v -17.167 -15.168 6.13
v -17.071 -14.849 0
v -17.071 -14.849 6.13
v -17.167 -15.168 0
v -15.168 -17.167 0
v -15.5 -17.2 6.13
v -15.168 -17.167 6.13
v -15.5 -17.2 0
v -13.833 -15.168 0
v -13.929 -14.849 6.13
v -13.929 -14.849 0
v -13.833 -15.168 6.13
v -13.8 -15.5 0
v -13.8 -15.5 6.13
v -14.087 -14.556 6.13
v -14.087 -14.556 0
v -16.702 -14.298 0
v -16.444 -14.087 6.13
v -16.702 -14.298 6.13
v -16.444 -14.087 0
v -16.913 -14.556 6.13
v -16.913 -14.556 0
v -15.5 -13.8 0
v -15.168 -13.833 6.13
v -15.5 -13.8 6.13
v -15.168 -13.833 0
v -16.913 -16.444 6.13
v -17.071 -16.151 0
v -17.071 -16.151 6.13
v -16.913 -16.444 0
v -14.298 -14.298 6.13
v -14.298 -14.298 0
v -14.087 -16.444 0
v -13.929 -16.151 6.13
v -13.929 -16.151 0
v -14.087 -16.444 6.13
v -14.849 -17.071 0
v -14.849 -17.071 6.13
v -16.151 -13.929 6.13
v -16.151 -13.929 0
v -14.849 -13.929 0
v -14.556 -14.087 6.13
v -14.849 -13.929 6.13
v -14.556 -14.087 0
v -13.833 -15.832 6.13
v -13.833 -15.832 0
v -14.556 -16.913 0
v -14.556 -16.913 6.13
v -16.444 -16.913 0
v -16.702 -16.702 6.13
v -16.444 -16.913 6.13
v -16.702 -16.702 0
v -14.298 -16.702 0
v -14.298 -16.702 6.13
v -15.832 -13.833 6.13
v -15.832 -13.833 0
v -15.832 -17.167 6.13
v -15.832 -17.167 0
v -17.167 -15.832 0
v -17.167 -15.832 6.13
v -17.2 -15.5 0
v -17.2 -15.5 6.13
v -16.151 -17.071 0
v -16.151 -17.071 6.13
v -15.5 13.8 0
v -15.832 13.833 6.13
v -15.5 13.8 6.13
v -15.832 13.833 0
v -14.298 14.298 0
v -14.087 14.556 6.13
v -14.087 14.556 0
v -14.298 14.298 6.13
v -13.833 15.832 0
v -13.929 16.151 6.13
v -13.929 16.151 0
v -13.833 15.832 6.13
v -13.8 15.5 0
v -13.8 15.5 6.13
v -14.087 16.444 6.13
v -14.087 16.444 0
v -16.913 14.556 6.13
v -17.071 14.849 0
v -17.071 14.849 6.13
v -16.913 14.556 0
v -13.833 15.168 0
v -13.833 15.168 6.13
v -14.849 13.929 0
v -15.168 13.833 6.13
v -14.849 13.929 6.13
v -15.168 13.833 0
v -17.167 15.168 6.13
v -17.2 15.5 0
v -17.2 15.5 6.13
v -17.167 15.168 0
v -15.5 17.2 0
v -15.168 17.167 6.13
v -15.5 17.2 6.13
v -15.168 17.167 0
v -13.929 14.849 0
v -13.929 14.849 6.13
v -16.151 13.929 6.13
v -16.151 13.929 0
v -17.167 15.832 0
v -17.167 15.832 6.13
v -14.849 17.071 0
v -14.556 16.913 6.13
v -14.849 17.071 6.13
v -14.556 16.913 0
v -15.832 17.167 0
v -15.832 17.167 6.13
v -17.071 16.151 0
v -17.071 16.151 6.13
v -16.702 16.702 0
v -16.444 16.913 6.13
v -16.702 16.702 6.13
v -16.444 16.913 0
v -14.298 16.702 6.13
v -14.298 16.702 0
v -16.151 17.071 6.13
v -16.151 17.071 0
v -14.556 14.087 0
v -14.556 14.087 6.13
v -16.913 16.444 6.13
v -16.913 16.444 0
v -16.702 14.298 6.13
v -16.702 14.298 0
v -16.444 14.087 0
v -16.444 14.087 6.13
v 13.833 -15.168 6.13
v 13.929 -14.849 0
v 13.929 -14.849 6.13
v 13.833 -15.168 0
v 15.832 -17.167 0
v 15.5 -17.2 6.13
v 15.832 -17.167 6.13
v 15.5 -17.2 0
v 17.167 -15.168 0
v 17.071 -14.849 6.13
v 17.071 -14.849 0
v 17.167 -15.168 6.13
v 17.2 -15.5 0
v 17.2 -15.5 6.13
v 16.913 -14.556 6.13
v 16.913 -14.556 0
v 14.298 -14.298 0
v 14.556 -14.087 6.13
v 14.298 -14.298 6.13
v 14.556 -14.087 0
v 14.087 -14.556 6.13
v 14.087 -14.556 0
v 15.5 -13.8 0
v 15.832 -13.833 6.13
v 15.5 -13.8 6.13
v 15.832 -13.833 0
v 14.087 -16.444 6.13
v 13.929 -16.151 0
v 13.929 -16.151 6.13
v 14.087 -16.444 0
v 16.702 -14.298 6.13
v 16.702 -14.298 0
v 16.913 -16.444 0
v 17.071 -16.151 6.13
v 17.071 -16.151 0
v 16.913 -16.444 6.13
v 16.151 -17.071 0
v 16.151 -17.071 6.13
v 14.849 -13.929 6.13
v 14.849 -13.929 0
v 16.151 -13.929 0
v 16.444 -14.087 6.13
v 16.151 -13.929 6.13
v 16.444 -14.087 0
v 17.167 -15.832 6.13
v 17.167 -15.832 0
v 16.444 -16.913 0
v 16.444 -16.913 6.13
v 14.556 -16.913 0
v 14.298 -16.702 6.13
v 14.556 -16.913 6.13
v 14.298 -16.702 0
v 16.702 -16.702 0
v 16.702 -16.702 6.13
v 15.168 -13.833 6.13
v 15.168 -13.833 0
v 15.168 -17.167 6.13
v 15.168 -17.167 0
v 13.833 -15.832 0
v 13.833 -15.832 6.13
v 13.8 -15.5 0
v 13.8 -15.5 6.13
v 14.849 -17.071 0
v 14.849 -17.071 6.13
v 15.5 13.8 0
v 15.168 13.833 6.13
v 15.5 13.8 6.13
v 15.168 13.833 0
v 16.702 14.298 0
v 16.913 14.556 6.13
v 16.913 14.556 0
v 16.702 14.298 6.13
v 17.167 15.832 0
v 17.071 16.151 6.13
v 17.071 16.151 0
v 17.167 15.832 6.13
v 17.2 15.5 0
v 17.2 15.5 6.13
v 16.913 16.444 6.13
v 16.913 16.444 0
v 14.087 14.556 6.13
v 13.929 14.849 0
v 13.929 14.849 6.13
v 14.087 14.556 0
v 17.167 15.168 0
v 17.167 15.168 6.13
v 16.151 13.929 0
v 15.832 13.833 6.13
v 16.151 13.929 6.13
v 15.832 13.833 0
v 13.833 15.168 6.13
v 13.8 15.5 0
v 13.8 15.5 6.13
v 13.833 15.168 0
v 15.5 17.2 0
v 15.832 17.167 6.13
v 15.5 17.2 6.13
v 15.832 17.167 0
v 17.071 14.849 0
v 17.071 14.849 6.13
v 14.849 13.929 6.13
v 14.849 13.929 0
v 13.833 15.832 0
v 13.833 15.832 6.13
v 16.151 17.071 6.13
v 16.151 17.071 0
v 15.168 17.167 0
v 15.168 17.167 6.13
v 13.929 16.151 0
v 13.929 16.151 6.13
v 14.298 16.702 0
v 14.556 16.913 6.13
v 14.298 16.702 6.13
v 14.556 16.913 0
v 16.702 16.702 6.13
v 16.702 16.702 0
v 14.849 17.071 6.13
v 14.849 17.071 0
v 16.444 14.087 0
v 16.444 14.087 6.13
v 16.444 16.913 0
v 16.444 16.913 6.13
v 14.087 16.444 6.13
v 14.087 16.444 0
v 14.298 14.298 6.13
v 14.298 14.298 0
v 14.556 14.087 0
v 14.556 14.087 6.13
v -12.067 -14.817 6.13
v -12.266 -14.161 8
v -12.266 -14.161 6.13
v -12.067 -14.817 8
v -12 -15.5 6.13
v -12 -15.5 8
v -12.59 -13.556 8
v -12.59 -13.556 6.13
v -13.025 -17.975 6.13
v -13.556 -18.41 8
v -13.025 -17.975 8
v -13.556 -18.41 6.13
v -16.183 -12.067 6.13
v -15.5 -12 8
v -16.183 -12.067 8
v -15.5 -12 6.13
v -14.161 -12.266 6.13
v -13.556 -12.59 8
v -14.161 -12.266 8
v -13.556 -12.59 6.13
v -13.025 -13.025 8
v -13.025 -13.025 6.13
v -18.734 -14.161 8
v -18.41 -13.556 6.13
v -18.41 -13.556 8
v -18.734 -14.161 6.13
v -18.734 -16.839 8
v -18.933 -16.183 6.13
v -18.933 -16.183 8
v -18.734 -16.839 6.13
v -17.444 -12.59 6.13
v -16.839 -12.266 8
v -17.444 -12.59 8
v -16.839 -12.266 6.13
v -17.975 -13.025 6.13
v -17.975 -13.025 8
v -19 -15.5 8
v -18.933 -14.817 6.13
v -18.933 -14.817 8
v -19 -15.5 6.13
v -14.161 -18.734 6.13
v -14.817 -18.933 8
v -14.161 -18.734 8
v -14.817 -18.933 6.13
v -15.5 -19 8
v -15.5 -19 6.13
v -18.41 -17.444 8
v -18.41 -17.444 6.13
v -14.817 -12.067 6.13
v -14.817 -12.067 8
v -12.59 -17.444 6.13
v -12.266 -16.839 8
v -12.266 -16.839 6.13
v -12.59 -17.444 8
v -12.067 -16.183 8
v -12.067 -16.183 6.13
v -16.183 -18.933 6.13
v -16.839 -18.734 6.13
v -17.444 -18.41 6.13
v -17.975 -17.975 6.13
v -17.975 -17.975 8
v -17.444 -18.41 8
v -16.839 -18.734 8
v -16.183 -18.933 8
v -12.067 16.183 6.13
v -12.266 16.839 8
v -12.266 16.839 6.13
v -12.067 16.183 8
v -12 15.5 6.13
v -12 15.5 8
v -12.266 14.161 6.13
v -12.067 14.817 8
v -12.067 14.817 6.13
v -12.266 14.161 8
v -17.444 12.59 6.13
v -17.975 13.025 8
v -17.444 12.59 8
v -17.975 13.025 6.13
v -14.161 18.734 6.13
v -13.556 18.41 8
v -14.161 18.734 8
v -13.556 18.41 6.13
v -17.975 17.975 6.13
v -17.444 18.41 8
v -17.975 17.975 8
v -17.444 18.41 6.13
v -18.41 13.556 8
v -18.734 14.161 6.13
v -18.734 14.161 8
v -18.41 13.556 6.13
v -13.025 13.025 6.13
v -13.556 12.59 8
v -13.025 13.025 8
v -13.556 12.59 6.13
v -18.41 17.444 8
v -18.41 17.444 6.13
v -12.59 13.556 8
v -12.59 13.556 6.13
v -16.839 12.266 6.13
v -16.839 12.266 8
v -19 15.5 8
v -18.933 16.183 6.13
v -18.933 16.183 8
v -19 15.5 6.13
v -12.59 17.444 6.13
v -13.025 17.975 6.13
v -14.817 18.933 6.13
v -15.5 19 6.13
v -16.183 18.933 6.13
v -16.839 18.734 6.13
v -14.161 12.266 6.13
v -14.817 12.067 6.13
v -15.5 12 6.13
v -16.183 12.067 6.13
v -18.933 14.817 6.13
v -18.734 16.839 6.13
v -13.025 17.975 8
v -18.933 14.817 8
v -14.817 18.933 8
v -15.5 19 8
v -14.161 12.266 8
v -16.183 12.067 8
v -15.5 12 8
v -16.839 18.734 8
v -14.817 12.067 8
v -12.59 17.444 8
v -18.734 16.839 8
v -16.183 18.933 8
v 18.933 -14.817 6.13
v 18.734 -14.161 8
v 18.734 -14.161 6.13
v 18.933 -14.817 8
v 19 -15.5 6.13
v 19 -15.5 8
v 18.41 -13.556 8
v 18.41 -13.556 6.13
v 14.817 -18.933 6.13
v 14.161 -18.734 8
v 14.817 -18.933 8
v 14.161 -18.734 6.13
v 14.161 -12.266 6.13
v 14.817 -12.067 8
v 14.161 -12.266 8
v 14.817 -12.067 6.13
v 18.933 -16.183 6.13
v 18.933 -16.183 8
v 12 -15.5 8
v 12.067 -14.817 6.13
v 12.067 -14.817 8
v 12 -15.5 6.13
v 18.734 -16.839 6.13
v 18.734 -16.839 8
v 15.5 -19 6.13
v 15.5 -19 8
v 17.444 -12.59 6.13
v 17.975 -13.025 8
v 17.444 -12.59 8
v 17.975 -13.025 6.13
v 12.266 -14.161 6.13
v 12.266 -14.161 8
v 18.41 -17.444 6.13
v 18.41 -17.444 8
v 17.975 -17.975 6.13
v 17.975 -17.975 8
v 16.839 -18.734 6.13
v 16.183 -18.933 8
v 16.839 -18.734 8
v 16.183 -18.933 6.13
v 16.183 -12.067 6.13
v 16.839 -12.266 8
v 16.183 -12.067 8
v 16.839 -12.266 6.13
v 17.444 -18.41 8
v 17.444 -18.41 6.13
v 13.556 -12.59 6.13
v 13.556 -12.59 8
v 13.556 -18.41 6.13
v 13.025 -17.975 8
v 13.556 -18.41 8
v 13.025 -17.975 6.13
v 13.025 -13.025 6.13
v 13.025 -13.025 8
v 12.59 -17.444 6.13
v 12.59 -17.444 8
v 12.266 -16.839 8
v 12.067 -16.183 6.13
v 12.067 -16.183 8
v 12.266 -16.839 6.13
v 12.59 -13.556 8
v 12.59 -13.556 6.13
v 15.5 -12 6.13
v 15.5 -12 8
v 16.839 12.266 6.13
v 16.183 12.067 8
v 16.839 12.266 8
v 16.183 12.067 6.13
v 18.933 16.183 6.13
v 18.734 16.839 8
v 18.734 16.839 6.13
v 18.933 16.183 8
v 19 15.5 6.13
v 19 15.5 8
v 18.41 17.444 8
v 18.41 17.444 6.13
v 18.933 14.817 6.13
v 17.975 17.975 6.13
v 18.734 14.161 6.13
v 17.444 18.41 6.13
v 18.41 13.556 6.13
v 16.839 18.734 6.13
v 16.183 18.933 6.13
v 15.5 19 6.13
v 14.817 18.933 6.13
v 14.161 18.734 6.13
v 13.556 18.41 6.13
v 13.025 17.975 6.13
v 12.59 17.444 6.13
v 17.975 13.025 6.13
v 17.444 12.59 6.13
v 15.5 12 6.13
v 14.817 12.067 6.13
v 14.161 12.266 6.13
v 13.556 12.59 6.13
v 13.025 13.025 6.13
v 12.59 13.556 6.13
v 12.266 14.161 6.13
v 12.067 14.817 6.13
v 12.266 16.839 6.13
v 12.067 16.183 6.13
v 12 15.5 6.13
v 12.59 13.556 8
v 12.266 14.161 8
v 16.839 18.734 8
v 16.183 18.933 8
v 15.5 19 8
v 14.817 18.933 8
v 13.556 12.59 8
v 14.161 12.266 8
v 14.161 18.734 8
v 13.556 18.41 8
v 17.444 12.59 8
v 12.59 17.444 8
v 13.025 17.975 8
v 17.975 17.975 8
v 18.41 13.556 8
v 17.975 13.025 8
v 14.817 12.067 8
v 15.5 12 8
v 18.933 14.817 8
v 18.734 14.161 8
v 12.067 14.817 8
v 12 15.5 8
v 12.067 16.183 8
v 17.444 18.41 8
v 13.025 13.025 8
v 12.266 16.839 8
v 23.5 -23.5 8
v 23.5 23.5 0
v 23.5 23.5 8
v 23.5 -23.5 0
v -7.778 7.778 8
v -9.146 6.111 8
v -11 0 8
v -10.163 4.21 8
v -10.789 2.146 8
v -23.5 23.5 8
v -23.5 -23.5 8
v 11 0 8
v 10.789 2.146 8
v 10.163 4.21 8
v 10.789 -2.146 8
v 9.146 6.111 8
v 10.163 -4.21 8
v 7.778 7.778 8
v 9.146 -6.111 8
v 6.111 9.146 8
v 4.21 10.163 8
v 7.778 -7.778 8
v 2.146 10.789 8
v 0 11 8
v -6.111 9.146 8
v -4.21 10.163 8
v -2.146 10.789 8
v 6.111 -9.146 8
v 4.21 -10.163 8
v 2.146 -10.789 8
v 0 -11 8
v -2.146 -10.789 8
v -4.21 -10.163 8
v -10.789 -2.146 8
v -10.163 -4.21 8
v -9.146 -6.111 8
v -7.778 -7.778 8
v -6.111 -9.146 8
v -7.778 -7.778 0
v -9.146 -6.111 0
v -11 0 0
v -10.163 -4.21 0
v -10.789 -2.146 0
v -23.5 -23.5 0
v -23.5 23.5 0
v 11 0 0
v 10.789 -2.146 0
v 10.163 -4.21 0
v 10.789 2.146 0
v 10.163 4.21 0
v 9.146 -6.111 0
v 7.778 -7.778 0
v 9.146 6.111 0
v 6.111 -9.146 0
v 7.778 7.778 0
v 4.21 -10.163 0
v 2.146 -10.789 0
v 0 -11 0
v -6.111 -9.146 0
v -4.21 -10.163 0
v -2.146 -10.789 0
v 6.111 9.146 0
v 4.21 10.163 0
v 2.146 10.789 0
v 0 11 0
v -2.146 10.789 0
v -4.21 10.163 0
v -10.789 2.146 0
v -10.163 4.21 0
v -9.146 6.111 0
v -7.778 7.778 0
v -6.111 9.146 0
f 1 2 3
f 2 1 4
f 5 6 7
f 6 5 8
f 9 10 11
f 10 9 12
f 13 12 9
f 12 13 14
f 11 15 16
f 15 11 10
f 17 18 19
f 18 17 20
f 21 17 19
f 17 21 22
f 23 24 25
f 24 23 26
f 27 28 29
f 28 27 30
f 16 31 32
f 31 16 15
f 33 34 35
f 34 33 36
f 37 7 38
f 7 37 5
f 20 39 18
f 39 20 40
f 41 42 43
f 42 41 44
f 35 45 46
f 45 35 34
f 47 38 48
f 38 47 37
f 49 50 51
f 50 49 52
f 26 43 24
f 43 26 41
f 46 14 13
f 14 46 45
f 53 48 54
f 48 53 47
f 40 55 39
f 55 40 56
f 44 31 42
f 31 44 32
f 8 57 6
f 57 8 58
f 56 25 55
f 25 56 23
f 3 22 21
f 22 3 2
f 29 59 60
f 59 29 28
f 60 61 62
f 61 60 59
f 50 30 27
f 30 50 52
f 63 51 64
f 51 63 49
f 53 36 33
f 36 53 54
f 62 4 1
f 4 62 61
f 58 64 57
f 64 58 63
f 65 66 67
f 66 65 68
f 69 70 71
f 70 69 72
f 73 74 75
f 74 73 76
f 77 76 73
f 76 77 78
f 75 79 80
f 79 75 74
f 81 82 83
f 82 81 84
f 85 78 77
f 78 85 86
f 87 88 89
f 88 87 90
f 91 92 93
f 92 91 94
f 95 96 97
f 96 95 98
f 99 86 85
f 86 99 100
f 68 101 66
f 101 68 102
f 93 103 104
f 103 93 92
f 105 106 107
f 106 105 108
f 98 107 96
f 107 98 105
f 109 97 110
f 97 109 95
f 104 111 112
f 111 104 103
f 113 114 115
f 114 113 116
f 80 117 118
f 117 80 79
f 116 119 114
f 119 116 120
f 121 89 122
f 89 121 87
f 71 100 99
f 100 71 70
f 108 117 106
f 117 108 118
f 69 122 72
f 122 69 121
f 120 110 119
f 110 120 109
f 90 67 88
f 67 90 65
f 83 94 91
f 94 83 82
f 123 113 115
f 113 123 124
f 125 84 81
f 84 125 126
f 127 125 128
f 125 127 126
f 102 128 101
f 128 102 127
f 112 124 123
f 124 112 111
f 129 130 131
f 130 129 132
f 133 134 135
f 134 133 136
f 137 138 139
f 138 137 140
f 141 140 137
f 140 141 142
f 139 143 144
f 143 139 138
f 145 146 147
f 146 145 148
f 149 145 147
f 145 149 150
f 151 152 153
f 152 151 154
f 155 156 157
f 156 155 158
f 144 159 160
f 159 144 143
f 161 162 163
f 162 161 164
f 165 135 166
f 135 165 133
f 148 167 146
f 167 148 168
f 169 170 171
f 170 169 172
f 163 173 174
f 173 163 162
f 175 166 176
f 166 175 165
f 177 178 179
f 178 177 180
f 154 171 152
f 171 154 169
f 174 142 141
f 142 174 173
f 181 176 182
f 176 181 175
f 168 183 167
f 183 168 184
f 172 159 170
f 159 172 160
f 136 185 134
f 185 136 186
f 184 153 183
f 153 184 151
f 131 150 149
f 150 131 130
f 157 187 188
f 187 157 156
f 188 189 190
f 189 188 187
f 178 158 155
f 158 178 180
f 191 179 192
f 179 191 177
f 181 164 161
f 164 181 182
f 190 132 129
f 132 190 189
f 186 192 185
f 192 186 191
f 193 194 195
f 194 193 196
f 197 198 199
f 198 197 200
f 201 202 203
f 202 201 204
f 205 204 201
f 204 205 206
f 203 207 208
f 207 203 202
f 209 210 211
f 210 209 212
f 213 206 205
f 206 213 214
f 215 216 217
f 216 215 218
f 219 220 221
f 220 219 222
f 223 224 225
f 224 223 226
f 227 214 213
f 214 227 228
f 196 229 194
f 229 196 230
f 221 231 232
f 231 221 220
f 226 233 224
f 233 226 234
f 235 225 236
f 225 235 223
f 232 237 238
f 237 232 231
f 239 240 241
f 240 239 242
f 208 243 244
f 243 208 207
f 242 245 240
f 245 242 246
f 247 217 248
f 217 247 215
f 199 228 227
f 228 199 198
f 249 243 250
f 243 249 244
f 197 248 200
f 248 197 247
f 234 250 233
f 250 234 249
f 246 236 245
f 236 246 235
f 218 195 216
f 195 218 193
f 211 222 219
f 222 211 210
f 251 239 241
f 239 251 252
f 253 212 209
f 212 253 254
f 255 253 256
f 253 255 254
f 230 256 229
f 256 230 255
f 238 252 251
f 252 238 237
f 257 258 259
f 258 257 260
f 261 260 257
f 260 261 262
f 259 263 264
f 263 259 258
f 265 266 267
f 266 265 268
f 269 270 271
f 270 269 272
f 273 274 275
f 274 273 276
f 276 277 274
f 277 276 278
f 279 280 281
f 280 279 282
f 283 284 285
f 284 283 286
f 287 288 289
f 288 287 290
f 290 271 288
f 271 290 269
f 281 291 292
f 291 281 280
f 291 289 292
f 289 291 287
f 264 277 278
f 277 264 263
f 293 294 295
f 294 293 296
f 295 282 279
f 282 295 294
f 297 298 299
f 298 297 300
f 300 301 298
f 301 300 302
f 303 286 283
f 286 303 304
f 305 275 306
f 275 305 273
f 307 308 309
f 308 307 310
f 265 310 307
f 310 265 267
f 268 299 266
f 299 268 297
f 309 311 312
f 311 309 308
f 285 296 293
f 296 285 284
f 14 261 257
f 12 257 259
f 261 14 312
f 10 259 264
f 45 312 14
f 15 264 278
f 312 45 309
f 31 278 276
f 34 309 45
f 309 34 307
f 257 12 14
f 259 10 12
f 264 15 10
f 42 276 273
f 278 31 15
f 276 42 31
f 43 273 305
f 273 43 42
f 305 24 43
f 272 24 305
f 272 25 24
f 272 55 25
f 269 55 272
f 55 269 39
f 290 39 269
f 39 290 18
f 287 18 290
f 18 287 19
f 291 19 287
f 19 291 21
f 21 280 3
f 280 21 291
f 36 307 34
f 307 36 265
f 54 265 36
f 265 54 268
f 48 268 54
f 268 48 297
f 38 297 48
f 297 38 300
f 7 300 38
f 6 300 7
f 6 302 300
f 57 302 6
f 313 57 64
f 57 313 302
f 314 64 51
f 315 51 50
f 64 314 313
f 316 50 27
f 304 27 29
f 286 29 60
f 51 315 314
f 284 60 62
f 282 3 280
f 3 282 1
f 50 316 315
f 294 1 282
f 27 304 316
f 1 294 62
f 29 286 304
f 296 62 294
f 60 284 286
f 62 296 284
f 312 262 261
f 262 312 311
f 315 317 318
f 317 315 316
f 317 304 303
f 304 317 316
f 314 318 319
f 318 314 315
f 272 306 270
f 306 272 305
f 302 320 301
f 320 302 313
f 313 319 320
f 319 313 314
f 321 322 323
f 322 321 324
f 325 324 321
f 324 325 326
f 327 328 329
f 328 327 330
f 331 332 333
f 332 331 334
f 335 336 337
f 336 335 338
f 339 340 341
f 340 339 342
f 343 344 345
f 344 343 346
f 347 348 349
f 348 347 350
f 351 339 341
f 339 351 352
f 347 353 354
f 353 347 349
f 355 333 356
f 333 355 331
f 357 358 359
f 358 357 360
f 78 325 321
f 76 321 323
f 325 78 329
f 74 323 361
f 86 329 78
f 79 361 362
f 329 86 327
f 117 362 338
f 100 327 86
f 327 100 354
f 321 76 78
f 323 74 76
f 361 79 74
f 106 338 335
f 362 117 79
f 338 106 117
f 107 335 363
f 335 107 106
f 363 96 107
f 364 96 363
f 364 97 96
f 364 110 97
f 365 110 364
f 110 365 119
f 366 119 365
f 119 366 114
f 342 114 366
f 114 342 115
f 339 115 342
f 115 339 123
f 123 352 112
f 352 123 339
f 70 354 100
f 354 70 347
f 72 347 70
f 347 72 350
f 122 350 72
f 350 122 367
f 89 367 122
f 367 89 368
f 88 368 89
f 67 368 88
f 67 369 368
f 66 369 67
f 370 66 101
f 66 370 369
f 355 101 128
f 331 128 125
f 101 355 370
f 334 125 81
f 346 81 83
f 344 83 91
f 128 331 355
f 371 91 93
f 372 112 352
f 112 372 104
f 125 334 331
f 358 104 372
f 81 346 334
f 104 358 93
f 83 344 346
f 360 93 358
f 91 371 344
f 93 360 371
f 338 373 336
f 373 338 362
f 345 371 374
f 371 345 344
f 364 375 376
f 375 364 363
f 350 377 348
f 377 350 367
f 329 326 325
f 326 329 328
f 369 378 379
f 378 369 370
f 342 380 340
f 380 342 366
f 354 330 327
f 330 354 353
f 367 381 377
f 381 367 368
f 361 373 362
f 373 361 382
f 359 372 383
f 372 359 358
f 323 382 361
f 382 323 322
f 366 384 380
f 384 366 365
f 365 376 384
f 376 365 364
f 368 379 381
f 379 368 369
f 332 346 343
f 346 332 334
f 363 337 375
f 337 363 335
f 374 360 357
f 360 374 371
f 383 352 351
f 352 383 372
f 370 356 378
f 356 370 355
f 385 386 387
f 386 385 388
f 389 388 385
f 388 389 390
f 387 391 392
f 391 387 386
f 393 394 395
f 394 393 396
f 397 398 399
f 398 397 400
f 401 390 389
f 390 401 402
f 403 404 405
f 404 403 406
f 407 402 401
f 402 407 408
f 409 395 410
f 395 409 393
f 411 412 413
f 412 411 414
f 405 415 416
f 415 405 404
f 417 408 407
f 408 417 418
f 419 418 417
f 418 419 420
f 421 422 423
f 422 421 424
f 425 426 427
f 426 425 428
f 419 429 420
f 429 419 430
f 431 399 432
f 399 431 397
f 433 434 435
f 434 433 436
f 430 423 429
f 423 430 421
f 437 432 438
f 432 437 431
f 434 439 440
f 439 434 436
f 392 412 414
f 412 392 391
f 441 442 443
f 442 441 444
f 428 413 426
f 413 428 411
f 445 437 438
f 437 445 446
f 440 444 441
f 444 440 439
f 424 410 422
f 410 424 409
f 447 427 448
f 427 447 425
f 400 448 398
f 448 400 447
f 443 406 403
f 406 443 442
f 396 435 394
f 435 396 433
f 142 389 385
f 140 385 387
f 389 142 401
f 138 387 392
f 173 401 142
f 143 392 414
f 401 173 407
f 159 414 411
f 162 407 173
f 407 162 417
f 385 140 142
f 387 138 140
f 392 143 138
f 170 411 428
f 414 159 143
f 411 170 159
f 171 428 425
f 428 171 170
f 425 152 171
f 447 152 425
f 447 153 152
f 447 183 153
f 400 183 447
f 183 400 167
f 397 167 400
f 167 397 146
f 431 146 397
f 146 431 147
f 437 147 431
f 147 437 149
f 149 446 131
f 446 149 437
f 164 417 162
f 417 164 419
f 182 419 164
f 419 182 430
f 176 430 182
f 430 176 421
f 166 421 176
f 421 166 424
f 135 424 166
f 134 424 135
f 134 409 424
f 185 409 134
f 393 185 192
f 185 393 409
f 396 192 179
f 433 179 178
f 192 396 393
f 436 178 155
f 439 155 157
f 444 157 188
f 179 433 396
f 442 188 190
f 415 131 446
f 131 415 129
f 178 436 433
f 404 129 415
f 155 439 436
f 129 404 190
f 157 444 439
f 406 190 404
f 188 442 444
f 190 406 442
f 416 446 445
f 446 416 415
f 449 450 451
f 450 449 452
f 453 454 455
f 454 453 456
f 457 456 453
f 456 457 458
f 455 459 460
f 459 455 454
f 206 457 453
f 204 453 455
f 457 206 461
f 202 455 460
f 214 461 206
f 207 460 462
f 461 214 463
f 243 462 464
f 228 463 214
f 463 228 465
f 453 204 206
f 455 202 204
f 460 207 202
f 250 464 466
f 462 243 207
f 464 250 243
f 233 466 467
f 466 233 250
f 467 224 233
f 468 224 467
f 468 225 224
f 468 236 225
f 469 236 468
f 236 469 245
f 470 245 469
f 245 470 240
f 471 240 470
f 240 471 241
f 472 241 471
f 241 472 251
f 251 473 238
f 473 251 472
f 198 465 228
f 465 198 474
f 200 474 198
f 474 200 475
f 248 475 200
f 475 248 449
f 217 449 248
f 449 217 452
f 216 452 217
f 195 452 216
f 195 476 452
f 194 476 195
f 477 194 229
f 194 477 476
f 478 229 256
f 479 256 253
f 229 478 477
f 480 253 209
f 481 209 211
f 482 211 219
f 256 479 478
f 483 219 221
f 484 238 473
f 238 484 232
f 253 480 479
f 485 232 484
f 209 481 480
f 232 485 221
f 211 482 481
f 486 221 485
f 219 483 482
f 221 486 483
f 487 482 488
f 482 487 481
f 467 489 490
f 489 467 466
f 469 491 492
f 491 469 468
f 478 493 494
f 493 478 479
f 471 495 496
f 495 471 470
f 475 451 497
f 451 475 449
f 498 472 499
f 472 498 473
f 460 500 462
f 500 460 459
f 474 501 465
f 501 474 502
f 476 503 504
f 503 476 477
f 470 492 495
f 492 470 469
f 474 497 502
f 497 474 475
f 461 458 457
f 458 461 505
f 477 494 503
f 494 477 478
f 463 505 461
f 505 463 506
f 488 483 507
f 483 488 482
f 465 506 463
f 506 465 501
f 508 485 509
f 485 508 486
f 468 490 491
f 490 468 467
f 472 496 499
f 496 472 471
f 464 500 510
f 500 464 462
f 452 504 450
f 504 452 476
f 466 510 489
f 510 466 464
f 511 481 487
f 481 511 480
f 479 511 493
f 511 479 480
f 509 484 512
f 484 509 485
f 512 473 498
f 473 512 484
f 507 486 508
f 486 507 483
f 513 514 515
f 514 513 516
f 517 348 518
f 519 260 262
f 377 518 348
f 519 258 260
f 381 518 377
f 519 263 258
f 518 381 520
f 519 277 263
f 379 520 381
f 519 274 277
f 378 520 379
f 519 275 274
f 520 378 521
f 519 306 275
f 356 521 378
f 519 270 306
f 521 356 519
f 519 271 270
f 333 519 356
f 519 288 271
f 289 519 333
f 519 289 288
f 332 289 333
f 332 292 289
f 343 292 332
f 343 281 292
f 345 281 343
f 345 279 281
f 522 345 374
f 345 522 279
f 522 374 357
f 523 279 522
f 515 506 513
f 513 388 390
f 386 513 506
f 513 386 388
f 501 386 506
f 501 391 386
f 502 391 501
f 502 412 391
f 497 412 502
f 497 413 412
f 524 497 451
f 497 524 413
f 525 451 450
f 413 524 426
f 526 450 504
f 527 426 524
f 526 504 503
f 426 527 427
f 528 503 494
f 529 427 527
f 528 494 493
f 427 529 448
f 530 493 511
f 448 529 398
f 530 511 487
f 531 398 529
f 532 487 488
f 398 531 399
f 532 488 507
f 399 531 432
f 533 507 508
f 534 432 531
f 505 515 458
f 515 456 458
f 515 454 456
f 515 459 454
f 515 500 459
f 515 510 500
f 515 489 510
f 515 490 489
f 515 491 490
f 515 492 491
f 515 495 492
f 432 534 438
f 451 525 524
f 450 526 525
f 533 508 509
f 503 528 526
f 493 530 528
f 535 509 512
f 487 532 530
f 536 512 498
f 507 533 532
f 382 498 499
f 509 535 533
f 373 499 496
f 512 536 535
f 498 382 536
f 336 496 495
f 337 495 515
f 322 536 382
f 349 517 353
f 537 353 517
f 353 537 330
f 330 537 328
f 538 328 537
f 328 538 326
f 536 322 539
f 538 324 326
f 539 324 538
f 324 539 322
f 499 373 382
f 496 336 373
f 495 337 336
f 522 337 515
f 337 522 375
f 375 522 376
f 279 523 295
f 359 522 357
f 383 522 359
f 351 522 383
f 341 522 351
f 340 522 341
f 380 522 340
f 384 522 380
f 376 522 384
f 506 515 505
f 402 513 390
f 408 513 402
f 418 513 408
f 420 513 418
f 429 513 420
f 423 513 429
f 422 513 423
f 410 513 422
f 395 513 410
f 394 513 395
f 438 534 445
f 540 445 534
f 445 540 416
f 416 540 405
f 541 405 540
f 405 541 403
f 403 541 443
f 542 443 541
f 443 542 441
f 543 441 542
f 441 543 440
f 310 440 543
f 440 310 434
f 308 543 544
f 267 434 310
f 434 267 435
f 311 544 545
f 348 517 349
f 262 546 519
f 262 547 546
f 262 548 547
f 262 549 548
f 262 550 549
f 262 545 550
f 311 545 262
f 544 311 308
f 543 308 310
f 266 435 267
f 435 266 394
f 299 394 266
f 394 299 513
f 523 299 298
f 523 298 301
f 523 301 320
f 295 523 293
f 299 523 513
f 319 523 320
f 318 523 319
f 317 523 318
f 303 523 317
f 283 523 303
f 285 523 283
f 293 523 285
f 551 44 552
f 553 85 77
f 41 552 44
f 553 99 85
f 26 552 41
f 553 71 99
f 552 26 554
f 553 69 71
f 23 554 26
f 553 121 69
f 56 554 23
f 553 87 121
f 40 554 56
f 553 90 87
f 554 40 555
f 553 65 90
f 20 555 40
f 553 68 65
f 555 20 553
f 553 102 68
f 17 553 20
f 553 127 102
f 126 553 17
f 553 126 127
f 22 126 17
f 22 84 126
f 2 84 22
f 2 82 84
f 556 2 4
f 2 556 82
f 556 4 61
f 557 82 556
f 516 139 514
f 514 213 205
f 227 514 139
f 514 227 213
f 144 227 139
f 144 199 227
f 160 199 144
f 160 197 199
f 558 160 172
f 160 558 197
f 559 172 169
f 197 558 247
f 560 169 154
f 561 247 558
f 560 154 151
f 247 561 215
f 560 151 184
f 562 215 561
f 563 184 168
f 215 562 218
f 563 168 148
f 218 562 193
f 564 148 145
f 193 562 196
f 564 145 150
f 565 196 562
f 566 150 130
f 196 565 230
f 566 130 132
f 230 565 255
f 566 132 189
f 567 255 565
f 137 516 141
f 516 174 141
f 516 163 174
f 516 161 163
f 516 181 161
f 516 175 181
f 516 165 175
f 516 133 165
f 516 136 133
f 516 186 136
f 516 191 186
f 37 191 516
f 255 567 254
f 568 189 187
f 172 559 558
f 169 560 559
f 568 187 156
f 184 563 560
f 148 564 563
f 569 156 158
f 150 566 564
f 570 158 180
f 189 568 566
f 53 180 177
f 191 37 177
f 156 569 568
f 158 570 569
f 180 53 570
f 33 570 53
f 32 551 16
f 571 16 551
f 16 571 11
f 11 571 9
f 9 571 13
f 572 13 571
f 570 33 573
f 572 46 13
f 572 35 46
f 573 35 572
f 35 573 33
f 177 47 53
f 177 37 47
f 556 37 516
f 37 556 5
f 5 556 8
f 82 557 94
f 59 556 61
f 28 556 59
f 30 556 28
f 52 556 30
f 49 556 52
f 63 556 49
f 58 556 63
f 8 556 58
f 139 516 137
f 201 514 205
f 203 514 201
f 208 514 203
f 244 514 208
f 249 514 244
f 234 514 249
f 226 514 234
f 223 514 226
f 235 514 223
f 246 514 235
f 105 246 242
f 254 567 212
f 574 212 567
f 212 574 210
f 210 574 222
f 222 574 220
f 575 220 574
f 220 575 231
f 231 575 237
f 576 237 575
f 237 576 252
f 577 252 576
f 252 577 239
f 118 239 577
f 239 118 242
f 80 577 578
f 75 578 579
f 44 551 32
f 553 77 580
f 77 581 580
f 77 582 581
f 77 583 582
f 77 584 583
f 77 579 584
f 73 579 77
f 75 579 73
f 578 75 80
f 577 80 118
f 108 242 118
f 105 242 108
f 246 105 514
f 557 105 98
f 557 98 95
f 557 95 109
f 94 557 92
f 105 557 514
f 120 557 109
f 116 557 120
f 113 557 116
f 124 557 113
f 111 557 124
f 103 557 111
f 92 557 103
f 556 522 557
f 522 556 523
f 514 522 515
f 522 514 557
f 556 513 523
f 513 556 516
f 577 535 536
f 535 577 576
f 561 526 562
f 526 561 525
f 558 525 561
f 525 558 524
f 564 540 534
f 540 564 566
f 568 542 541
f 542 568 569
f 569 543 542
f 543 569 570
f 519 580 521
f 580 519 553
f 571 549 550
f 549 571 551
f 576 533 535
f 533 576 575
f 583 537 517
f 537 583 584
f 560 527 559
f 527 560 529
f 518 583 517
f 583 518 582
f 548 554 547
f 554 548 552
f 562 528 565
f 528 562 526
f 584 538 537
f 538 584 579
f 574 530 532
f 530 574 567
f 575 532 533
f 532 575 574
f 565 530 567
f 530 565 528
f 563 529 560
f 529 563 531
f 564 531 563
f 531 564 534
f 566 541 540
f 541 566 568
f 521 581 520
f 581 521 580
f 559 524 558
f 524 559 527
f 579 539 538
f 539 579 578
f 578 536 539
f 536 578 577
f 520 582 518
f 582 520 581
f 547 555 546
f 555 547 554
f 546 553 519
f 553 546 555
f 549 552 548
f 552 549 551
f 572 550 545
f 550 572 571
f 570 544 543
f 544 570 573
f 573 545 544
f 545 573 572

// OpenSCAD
$fn = 32;

// ----------------------------------------------------------------------
// Motor mount plate: NEMA17, 47 x 47 x 8 mm
// ----------------------------------------------------------------------

// --- parameters (mm) ---
plate_w = 47;             // plate length, X
plate_d = 47;             // plate width, Y
plate_t = 8;              // plate thickness
pattern = 31;             // NEMA17 bolt spacing
motor_d = 3.4;            // NEMA17 screw clearance
pilot_d = 22;             // pilot boss bore
cb_d = 7;                 // counterbore seat
cb_h = 1.87;              // counterbore depth

module plate() {
  translate([-plate_w / 2, -plate_d / 2, 0]) cube([plate_w, plate_d, plate_t]);
}

module motor_holes() {
  for (sx = [-1, 1]) for (sy = [-1, 1])
    translate([sx * pattern / 2, sy * pattern / 2, -1])
      cylinder(h = plate_t + 2, d = motor_d);
}
module motor_counterbores() {
  for (sx = [-1, 1]) for (sy = [-1, 1])
    translate([sx * pattern / 2, sy * pattern / 2, plate_t - cb_h])
      cylinder(h = cb_h + 0.6, d = cb_d);
}

difference() {
  union() {
    plate();
  }
  motor_holes();
  translate([0, 0, -1]) cylinder(h = plate_t + 2, d = pilot_d);
  motor_counterbores();
}
